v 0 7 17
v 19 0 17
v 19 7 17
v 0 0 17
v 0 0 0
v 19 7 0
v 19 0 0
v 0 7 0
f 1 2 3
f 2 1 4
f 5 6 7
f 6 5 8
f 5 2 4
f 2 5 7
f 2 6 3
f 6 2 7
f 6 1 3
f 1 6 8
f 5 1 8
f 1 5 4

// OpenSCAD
// Generated by SolidPython 1.0.1 on 2020-07-29 00:46:56


cube(size = [19, 7, 17]);
/***********************************************
*********      SolidPython code:      **********
************************************************
 
# import packages: SolidPython
from solid import *
from solid.utils import *
from itertools import chain, combinations, permutations


class Resize:

    def __init__(self, scad_file):
        self.scad_file = scad_file
        #self.scad_file = import_scad(scad_file)
        # cone/cylinder param:
        self.r1 = 0
        self.r2 = 0
        self.h = 0
        # rectangular prism param:
        self.w = 0
        self.l = 0
        # ellipse param:
        self.r = 0

    # import OpenScad code (file name corresponds to shape)


    # classify shape + parameters
    def assign(self, param1, param2, param3):
        if self.scad_file == 'cone.scad':
            self.r1 = param1
            self.r2 = param2
            self.h = param3
        elif self.scad_file == 'cylinder.scad':
            self.r1 = param1
            self.r2 = param2
            self.h = param3
        elif self.scad_file == 'rectangularPrism.scad':
            self.h = param1
            self.l = param2
            self.w = param3
        else:
            self.r = param1
            self.h = param2

    # resize parameters
    def iterate(self):
        x = range(3, 20, 2)
        i = 1
        if self.scad_file == 'cone.scad':
            tempList = list(permutations(x, 2))
            for temp in tempList:
                param1 = temp[0]
                param2 = temp[1]
                filepath = 'produced_scad_files/' + 'cone' + str(param1) + '_' + str(param2) + '_' + '.scad'
                scad_render_to_file(cylinder(h=param1, r1=param2, r2=0), filepath)

        elif self.scad_file == 'cylinder.scad':
            tempList = list(permutations(x, 3))
            for temp in tempList:
                param1 = temp[0]
                param2 = temp[1]
                filepath = 'produced_scad_files/' + 'cylinder' + str(param1) + '_' + str(param2) + '_' + '.scad'
                scad_render_to_file(cylinder(h=param1, r1=param2, r2=param2), filepath)

        elif self.scad_file == 'rectangularPrism.scad':
            tempList = list(permutations(x, 3))
            for temp in tempList:
                param1 = temp[0]
                param2 = temp[1]
                param3 = temp[2]
                filepath = 'produced_scad_files/' + 'rectangularPrism' + str(param1) + '_' + str(param2) + '_' + str(
                    param3) + '.scad'
                scad_render_to_file(cube(size=(param1, param2, param3)), filepath)

        elif self.scad_file == 'ellipse.scad':
            tempList = list(permutations(x, 4))
            for temp in tempList:
                param1 = temp[0]
                param2 = temp[1]
                param3 = temp[2]
                param4 = temp[3]
                filepath = 'produced_scad_files/' + 'ellipse' + str(param1) + '_' + str(param2) + '_' + str(param3) + '_' + str(param4) + '.scad'
                scad_render_to_file(scale([param1, param2, param3])(sphere(r=param4)), filepath)

    def render_to_scadfile(self):
        scad_render_to_file(scad, 'example.scad') 
 
************************************************/
